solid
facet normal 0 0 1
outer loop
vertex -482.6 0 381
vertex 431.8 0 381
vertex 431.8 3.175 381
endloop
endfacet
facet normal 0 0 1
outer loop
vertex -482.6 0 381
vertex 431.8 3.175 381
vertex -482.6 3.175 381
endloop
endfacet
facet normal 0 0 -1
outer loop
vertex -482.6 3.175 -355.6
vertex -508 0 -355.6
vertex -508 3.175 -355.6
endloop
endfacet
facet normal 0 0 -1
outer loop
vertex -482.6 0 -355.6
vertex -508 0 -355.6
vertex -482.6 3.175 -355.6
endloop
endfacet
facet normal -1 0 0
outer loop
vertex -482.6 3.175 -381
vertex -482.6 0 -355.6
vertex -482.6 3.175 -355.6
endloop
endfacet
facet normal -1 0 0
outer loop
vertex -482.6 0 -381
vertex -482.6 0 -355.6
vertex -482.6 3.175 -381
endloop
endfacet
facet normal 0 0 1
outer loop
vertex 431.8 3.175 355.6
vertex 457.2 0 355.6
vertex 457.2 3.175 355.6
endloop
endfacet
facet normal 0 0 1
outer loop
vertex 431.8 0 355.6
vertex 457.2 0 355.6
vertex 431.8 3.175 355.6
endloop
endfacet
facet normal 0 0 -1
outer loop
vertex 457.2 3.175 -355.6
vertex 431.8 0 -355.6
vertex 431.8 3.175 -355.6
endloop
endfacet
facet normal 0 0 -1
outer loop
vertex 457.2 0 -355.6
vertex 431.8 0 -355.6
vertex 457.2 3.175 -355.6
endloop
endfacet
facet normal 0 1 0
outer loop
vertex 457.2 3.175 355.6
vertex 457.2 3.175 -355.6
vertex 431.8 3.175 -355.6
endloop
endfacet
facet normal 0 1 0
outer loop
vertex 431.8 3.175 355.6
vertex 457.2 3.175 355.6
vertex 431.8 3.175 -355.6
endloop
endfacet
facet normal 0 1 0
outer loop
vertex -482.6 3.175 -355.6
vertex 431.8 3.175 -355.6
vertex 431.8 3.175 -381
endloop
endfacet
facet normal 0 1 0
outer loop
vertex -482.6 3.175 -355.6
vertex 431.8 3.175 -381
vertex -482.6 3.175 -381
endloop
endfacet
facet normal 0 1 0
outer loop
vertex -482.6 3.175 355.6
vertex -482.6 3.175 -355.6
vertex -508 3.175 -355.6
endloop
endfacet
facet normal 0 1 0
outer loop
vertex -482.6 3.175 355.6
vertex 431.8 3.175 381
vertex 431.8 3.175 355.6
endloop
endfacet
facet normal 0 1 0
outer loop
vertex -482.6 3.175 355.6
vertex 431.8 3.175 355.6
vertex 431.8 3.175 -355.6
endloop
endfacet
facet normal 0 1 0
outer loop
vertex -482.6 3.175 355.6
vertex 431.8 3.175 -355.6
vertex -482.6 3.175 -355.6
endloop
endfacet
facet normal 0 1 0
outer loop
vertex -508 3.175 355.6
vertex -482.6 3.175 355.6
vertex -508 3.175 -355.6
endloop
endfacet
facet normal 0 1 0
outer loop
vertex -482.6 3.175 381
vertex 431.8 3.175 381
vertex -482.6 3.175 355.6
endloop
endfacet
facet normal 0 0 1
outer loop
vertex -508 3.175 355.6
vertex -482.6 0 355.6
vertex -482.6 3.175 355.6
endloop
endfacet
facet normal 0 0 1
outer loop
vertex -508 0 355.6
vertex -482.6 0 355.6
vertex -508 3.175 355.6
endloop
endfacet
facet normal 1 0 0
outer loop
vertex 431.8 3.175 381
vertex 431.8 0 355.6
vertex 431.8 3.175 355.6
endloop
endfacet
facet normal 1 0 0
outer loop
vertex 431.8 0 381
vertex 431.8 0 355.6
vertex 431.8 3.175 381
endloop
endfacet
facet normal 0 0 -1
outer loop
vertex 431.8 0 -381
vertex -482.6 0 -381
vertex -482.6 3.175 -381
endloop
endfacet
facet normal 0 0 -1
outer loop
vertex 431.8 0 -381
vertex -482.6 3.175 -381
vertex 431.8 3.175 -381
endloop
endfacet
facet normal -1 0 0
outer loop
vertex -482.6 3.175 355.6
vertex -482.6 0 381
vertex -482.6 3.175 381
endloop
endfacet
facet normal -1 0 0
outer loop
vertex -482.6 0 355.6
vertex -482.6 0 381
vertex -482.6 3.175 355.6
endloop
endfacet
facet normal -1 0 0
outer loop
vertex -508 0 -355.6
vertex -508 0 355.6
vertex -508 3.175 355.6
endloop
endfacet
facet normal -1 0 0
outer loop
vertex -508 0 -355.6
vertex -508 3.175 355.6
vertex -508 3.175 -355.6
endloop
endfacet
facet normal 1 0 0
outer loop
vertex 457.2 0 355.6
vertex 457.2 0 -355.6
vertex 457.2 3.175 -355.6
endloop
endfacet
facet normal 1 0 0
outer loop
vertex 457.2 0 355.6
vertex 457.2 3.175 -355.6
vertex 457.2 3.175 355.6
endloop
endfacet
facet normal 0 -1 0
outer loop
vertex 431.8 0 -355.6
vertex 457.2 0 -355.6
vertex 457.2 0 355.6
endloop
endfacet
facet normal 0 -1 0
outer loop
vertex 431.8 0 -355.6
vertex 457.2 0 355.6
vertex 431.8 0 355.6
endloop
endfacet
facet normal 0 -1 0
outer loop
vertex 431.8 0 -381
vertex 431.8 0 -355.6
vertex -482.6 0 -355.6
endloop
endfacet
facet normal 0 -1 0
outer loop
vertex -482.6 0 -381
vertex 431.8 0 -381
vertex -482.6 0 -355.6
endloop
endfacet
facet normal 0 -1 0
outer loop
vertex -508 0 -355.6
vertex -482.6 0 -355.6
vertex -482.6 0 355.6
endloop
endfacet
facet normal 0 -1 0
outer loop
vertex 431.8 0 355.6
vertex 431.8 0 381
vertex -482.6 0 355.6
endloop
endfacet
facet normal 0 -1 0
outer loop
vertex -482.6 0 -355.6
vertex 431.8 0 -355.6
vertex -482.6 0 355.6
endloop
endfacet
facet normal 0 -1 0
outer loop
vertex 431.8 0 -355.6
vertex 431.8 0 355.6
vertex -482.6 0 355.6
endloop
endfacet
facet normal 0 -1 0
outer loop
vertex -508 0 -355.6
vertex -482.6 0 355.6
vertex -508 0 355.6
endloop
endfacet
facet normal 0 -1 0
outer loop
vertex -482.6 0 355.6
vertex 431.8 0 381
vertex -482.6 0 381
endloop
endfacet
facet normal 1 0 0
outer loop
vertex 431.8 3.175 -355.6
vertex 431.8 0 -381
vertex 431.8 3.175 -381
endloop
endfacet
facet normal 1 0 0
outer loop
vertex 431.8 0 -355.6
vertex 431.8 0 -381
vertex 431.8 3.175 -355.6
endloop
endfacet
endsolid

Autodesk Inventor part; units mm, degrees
ref_plane "YZ Plane" through (0, 0, 0) normal (1, 0, 0) x (0, 1, 0)
ref_plane "XZ Plane" through (0, 0, 0) normal (0, 1, 0) x (-1, 0, 0)
ref_plane "XY Plane" through (0, 0, 0) normal (0, 0, 1) x (1, 0, 0)
sketch "Sketch1" plane through (0, 0, 0) normal (0, 1, 0) x (-1, 0, 0)
  line L0 (508, 355.6) -> (508, -355.6)
  line L1 (508, -355.6) -> (482.6, -355.6)
  line L2 (482.6, -355.6) -> (482.6, -381)
  line L3 (482.6, -381) -> (-431.8, -381)
  line L4 (-431.8, -381) -> (-431.8, -355.6)
  line L5 (-431.8, -355.6) -> (-457.2, -355.6)
  line L6 (-457.2, -355.6) -> (-457.2, 355.6)
  line L7 (-457.2, 355.6) -> (-431.8, 355.6)
  line L8 (-431.8, 355.6) -> (-431.8, 381)
  line L9 (-431.8, 381) -> (482.6, 381)
  line L10 (482.6, 381) -> (482.6, 355.6)
  line L11 (482.6, 355.6) -> (508, 355.6)
  point P0 (0, 0)
  dimension "d0" = 711.2
  dimension "d1" = 25.4
  dimension "d2" = 25.4
  dimension "d4" = 25.4
  dimension "d5" = 25.4
  dimension "d6" = 711.2
  dimension "d7" = 25.4
  dimension "d8" = 25.4
  dimension "d10" = 25.4
  dimension "d11" = 508
  dimension "d12" = 381
  dimension "d15" = 914.4
extrude "Extrusion1" add sketch "Sketch1" along normal blind 3.175
properties part number "cart plywood"
